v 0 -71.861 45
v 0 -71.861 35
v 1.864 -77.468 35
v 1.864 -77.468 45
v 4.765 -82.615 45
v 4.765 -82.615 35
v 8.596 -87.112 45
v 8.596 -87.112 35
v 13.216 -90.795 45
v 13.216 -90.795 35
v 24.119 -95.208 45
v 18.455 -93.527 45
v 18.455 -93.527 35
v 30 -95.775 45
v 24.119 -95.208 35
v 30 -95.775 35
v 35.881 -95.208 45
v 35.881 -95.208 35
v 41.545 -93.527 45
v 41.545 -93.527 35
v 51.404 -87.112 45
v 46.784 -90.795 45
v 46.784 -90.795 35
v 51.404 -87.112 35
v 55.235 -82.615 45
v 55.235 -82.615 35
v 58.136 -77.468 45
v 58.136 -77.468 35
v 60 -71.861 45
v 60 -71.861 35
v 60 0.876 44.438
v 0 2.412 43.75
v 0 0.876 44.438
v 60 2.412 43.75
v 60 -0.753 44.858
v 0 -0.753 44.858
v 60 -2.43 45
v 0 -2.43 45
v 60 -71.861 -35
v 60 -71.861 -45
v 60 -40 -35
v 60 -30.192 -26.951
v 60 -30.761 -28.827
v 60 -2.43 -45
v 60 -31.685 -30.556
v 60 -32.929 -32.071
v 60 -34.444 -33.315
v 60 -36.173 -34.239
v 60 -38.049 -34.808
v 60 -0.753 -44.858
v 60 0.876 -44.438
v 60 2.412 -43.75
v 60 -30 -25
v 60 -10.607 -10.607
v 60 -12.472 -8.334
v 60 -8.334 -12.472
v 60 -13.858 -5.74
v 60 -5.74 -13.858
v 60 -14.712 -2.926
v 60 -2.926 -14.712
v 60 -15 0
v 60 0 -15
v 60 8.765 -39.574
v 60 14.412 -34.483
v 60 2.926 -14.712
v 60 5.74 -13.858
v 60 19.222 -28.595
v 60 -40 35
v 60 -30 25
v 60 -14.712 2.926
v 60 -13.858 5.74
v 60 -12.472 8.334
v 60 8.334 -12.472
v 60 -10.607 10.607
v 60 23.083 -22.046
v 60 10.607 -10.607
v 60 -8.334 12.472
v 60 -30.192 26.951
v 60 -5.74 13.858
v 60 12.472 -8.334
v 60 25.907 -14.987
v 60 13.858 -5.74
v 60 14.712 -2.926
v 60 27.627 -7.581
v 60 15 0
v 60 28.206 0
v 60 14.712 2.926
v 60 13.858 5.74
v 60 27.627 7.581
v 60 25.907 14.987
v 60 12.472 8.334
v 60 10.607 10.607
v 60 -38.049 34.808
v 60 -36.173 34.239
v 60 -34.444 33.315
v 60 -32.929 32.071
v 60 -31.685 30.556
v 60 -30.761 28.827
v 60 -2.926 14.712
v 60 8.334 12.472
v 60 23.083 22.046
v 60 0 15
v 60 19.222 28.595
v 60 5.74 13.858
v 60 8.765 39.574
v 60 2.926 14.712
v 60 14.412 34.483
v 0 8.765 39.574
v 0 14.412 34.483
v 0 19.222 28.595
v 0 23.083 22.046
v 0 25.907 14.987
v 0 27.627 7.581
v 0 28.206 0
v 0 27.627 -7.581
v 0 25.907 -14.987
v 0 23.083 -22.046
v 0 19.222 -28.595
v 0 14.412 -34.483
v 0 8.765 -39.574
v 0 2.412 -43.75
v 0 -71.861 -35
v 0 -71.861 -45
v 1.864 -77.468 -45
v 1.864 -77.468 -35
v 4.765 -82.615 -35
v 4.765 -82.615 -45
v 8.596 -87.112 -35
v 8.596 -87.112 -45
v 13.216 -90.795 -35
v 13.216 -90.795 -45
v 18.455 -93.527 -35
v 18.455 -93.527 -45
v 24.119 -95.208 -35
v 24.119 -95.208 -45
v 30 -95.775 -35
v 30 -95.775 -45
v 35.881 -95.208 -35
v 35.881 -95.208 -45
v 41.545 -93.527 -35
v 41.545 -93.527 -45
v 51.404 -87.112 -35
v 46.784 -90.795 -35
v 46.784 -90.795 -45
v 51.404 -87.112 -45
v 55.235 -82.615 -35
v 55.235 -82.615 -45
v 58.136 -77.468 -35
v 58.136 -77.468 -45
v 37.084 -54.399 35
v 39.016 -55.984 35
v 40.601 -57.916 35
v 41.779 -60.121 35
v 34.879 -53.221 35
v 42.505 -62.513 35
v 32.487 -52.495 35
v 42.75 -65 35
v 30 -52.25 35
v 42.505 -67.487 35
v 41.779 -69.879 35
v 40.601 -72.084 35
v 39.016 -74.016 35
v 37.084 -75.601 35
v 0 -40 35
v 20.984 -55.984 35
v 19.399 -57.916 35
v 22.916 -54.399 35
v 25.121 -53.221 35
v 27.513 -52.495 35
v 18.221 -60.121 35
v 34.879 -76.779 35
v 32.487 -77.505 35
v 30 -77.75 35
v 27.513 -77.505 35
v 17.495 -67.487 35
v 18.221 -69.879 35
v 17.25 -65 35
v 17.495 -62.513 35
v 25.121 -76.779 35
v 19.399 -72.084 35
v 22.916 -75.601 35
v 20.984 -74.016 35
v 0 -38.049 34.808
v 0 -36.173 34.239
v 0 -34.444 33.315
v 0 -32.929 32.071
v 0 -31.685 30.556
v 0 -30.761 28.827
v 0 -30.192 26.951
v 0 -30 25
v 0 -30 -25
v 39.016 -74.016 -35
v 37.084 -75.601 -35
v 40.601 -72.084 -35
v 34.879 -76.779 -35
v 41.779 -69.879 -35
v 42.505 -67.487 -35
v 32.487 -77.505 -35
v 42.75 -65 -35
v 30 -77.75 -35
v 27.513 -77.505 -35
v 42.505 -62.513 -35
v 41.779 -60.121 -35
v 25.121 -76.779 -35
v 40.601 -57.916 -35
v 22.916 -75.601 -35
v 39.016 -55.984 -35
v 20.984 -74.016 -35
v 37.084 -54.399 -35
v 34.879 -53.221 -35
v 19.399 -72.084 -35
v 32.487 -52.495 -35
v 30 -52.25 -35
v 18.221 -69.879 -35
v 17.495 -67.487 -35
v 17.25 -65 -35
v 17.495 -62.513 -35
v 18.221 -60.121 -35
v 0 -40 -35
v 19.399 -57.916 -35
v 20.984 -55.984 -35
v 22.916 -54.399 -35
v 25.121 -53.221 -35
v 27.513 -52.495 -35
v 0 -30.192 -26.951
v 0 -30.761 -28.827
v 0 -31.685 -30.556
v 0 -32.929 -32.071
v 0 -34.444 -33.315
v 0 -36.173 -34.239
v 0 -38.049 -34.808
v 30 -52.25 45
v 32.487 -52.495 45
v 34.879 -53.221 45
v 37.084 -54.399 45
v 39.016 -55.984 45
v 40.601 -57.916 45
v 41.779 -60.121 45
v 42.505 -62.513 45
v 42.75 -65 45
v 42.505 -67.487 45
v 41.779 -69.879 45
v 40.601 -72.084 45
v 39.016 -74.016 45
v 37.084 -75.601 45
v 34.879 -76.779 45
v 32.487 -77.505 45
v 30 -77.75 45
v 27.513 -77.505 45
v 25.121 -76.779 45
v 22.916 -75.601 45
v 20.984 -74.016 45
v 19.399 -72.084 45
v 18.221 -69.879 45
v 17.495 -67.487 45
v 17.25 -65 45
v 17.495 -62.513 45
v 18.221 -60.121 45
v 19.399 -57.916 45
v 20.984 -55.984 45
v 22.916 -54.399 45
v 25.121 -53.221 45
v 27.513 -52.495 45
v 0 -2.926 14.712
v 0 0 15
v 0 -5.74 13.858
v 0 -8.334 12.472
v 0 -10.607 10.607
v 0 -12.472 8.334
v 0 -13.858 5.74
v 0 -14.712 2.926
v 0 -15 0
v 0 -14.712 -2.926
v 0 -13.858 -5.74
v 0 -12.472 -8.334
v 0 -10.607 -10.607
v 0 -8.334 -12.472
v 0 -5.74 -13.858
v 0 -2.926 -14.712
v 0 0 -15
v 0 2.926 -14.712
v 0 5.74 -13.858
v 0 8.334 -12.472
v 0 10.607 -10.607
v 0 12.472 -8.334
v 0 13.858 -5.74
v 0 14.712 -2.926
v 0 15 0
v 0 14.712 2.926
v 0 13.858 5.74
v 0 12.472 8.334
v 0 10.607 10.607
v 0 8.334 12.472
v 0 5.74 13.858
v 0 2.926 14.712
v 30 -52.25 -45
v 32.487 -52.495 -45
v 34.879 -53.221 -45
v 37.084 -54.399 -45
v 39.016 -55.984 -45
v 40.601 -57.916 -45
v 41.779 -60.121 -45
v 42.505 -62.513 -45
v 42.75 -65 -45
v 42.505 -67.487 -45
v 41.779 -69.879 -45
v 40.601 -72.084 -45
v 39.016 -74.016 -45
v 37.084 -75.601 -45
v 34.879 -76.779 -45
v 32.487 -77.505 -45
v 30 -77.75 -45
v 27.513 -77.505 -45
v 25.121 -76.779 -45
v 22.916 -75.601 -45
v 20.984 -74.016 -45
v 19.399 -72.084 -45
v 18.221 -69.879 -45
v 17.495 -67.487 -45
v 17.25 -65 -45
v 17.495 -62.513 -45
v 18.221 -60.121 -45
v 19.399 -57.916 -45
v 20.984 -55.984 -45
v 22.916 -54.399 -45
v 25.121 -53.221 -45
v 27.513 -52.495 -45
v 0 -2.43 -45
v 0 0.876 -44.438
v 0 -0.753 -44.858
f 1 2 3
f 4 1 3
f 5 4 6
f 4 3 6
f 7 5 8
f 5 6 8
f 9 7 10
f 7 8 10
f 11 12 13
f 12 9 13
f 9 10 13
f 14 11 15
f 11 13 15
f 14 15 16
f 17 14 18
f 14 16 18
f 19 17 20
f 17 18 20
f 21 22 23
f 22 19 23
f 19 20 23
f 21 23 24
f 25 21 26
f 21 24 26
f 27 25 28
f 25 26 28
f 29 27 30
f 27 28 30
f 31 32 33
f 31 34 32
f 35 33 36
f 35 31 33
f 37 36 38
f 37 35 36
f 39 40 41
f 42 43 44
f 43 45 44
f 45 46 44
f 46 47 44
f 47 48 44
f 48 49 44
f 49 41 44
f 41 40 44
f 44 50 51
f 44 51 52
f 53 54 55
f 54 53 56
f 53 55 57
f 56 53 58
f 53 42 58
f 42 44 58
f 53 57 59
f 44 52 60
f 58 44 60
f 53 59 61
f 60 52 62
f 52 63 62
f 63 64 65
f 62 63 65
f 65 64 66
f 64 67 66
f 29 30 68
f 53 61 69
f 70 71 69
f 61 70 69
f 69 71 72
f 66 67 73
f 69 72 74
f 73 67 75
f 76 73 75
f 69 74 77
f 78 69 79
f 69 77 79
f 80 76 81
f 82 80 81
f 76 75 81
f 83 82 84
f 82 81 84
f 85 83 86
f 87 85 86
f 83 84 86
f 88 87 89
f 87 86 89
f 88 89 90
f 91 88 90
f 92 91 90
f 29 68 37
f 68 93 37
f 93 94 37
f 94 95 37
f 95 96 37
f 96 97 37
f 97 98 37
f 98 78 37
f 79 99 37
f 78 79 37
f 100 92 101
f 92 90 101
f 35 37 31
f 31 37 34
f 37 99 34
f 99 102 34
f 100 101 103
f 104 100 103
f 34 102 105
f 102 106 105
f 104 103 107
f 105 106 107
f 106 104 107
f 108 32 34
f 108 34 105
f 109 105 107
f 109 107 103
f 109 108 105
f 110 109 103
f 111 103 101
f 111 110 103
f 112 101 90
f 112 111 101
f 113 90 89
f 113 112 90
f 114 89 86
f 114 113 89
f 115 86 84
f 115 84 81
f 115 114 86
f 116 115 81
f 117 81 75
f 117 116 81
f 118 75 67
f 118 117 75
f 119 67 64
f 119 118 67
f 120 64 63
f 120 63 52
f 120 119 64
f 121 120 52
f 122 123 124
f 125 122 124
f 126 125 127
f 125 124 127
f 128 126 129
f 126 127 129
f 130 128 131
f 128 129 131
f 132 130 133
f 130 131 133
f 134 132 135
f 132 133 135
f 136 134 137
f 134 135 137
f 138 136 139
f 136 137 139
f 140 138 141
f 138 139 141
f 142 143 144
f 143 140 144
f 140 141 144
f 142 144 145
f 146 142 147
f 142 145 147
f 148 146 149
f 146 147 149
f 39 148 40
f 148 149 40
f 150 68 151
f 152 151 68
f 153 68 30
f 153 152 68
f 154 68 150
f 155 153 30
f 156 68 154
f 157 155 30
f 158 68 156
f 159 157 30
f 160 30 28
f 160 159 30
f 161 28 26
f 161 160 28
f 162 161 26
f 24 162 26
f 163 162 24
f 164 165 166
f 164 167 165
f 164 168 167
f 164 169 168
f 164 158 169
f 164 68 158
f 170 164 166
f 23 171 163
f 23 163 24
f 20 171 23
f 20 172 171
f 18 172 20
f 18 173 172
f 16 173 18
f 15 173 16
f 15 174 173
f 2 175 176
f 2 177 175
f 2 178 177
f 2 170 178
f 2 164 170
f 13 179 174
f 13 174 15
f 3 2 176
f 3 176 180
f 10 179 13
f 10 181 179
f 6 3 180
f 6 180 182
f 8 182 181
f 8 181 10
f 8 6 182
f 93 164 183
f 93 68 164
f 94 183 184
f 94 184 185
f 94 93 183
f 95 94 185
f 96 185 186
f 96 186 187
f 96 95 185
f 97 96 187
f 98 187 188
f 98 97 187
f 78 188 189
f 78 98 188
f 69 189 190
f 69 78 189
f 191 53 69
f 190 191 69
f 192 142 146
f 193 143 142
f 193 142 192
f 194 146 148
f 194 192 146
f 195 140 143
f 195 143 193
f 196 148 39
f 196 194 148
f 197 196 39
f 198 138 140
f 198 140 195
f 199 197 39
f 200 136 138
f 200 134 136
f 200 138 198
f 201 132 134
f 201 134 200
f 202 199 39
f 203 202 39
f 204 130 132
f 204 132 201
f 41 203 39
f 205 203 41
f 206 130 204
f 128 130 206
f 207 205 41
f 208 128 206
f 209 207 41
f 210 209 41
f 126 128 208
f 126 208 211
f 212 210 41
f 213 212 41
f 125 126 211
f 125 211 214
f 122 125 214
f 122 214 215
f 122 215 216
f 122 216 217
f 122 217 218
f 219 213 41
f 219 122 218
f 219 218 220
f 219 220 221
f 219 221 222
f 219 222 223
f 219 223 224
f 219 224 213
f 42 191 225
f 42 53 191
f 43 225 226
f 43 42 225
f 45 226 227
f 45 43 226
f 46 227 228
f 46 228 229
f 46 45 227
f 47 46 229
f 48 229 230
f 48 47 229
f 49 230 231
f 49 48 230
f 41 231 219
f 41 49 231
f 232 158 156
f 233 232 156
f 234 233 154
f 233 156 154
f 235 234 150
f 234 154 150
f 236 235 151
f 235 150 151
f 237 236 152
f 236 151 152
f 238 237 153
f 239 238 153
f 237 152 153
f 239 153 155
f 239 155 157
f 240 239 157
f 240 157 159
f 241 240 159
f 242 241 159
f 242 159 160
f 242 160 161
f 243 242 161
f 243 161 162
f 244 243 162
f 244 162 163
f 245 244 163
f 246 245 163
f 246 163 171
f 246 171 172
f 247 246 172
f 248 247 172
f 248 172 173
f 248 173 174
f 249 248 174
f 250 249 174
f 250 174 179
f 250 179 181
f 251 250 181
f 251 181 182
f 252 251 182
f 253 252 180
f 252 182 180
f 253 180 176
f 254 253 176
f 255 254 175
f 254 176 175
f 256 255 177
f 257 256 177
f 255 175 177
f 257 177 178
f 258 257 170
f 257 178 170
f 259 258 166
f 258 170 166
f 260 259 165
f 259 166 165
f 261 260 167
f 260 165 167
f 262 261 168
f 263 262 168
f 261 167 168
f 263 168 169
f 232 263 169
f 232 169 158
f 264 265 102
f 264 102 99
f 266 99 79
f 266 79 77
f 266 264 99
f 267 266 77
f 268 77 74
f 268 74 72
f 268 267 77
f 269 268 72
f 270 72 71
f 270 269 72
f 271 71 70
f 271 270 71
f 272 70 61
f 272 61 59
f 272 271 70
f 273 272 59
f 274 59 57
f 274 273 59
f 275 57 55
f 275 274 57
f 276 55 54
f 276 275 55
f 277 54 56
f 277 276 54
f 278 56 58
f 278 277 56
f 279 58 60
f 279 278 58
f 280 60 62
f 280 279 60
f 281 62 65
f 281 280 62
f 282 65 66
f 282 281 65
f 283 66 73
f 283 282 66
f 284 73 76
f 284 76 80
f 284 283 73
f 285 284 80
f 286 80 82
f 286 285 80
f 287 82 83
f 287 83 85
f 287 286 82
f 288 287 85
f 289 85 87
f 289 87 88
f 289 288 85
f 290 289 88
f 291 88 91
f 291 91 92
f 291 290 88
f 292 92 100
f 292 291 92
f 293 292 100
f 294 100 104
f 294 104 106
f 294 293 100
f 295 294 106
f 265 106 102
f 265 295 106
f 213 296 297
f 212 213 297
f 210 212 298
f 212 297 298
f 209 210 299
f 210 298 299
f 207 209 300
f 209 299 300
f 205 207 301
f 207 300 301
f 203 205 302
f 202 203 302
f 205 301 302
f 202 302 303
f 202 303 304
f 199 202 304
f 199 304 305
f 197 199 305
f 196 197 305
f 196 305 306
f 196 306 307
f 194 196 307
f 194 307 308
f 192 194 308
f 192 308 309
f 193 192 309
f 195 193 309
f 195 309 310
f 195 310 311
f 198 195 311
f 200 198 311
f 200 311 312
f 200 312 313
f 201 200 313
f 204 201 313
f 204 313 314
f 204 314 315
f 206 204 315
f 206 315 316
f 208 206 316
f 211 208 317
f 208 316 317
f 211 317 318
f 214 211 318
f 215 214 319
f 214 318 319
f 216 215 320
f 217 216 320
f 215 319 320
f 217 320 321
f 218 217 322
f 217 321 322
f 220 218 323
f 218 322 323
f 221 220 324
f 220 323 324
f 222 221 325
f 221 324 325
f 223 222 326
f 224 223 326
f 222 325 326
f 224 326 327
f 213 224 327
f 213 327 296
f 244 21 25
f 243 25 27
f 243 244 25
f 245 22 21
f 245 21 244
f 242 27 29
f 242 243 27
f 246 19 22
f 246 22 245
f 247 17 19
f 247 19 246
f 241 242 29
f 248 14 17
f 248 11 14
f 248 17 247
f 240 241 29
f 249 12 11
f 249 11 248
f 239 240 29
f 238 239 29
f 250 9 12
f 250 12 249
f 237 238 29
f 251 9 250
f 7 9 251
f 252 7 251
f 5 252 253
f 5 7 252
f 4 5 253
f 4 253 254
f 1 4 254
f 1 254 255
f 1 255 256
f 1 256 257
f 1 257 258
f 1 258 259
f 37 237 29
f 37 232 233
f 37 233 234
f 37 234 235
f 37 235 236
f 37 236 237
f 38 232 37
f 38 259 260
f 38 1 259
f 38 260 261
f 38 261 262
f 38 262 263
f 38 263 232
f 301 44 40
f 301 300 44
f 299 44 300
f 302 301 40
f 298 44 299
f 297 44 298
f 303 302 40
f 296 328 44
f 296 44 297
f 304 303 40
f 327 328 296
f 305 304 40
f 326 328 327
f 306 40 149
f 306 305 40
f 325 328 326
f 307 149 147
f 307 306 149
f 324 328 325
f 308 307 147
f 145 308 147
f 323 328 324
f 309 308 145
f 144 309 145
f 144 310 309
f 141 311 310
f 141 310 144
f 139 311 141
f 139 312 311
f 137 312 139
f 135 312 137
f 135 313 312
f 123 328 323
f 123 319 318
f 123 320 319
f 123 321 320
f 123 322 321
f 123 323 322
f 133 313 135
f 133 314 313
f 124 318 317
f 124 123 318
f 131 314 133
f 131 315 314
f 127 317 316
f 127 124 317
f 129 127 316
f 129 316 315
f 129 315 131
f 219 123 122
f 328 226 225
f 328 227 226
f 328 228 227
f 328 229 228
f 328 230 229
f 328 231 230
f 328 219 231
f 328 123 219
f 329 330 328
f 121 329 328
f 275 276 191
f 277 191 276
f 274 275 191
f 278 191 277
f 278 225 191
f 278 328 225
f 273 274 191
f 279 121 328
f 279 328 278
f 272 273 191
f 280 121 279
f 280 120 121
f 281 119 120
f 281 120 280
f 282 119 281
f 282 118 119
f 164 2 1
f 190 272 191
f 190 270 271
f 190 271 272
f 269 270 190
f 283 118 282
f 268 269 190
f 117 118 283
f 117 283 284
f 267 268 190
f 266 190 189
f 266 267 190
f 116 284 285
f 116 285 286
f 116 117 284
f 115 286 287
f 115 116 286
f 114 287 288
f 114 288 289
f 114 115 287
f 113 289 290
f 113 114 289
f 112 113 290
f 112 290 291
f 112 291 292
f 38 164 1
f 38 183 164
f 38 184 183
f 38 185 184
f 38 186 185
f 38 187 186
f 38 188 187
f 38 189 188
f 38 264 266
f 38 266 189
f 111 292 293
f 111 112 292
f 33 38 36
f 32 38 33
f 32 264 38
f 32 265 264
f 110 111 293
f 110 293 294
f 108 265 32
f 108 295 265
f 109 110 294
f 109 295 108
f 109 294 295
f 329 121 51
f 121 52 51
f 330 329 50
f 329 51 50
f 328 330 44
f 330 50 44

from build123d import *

# Parameters (mm, degrees)
ESQUISSE1_R             = 15
BOSS_EXTRU_1_DEPTH      = 60
ESQUISSE2_R             = 12.75
ENL_V_MAT_EXTRU_1_DEPTH = 148.309198627
CONG_1_R                = 10


with BuildPart() as part:
    # Esquisse1 → Boss.-Extru.1 (new body)
    with BuildSketch(Plane(origin=(0, 0, 0), x_dir=(0, 0, -1), z_dir=(1, 0, 0))):
        with BuildLine():
            ThreePointArc((45, 0), (0, 28.205505282), (-45, 0))
            Line((-45, 0), (-45, -100))
            Line((-45, -100), (-35, -100))
            Line((-35, -100), (-35, -30))
            Line((-35, -30), (35, -30))
            Line((35, -30), (35, -100))
            Line((35, -100), (45, -100))
            Line((45, -100), (45, 0))
        make_face()
        Circle(ESQUISSE1_R, mode=Mode.SUBTRACT)
    extrude(amount=BOSS_EXTRU_1_DEPTH)

    # Esquisse2 → Enlèv. mat.-Extru.1 (cut, through all)
    with BuildSketch(Plane(origin=(0, 0, -45), x_dir=(-1, 0, 0), z_dir=(0, 0, -1))):
        with Locations((-30, -65)):
            Circle(ESQUISSE2_R)
        with BuildLine():
            Line((-60, -71.861434349), (-96.965788421, -71.861434349))
            Line((-96.965788421, -71.861434349), (-96.965788421, -138.438192961))
            Line((-96.965788421, -138.438192961), (33.77611945, -138.438192961))
            Line((33.77611945, -138.438192961), (33.77611945, -71.861434349))
            Line((33.77611945, -71.861434349), (0, -71.861434349))
            ThreePointArc((0, -71.861434349), (-30, -95.774653228), (-60, -71.861434349))
        make_face()
    extrude(amount=-ENL_V_MAT_EXTRU_1_DEPTH, mode=Mode.SUBTRACT)

    # Congé1
    cong_1_edges = [part.edges().sort_by_distance(p)[0] for p in [
        (30, 0, -45),
        (30, 0, 45),
        (30, -30, 35),
        (30, -30, -35),
    ]]
    fillet(cong_1_edges, radius=CONG_1_R)


solid = part.part
